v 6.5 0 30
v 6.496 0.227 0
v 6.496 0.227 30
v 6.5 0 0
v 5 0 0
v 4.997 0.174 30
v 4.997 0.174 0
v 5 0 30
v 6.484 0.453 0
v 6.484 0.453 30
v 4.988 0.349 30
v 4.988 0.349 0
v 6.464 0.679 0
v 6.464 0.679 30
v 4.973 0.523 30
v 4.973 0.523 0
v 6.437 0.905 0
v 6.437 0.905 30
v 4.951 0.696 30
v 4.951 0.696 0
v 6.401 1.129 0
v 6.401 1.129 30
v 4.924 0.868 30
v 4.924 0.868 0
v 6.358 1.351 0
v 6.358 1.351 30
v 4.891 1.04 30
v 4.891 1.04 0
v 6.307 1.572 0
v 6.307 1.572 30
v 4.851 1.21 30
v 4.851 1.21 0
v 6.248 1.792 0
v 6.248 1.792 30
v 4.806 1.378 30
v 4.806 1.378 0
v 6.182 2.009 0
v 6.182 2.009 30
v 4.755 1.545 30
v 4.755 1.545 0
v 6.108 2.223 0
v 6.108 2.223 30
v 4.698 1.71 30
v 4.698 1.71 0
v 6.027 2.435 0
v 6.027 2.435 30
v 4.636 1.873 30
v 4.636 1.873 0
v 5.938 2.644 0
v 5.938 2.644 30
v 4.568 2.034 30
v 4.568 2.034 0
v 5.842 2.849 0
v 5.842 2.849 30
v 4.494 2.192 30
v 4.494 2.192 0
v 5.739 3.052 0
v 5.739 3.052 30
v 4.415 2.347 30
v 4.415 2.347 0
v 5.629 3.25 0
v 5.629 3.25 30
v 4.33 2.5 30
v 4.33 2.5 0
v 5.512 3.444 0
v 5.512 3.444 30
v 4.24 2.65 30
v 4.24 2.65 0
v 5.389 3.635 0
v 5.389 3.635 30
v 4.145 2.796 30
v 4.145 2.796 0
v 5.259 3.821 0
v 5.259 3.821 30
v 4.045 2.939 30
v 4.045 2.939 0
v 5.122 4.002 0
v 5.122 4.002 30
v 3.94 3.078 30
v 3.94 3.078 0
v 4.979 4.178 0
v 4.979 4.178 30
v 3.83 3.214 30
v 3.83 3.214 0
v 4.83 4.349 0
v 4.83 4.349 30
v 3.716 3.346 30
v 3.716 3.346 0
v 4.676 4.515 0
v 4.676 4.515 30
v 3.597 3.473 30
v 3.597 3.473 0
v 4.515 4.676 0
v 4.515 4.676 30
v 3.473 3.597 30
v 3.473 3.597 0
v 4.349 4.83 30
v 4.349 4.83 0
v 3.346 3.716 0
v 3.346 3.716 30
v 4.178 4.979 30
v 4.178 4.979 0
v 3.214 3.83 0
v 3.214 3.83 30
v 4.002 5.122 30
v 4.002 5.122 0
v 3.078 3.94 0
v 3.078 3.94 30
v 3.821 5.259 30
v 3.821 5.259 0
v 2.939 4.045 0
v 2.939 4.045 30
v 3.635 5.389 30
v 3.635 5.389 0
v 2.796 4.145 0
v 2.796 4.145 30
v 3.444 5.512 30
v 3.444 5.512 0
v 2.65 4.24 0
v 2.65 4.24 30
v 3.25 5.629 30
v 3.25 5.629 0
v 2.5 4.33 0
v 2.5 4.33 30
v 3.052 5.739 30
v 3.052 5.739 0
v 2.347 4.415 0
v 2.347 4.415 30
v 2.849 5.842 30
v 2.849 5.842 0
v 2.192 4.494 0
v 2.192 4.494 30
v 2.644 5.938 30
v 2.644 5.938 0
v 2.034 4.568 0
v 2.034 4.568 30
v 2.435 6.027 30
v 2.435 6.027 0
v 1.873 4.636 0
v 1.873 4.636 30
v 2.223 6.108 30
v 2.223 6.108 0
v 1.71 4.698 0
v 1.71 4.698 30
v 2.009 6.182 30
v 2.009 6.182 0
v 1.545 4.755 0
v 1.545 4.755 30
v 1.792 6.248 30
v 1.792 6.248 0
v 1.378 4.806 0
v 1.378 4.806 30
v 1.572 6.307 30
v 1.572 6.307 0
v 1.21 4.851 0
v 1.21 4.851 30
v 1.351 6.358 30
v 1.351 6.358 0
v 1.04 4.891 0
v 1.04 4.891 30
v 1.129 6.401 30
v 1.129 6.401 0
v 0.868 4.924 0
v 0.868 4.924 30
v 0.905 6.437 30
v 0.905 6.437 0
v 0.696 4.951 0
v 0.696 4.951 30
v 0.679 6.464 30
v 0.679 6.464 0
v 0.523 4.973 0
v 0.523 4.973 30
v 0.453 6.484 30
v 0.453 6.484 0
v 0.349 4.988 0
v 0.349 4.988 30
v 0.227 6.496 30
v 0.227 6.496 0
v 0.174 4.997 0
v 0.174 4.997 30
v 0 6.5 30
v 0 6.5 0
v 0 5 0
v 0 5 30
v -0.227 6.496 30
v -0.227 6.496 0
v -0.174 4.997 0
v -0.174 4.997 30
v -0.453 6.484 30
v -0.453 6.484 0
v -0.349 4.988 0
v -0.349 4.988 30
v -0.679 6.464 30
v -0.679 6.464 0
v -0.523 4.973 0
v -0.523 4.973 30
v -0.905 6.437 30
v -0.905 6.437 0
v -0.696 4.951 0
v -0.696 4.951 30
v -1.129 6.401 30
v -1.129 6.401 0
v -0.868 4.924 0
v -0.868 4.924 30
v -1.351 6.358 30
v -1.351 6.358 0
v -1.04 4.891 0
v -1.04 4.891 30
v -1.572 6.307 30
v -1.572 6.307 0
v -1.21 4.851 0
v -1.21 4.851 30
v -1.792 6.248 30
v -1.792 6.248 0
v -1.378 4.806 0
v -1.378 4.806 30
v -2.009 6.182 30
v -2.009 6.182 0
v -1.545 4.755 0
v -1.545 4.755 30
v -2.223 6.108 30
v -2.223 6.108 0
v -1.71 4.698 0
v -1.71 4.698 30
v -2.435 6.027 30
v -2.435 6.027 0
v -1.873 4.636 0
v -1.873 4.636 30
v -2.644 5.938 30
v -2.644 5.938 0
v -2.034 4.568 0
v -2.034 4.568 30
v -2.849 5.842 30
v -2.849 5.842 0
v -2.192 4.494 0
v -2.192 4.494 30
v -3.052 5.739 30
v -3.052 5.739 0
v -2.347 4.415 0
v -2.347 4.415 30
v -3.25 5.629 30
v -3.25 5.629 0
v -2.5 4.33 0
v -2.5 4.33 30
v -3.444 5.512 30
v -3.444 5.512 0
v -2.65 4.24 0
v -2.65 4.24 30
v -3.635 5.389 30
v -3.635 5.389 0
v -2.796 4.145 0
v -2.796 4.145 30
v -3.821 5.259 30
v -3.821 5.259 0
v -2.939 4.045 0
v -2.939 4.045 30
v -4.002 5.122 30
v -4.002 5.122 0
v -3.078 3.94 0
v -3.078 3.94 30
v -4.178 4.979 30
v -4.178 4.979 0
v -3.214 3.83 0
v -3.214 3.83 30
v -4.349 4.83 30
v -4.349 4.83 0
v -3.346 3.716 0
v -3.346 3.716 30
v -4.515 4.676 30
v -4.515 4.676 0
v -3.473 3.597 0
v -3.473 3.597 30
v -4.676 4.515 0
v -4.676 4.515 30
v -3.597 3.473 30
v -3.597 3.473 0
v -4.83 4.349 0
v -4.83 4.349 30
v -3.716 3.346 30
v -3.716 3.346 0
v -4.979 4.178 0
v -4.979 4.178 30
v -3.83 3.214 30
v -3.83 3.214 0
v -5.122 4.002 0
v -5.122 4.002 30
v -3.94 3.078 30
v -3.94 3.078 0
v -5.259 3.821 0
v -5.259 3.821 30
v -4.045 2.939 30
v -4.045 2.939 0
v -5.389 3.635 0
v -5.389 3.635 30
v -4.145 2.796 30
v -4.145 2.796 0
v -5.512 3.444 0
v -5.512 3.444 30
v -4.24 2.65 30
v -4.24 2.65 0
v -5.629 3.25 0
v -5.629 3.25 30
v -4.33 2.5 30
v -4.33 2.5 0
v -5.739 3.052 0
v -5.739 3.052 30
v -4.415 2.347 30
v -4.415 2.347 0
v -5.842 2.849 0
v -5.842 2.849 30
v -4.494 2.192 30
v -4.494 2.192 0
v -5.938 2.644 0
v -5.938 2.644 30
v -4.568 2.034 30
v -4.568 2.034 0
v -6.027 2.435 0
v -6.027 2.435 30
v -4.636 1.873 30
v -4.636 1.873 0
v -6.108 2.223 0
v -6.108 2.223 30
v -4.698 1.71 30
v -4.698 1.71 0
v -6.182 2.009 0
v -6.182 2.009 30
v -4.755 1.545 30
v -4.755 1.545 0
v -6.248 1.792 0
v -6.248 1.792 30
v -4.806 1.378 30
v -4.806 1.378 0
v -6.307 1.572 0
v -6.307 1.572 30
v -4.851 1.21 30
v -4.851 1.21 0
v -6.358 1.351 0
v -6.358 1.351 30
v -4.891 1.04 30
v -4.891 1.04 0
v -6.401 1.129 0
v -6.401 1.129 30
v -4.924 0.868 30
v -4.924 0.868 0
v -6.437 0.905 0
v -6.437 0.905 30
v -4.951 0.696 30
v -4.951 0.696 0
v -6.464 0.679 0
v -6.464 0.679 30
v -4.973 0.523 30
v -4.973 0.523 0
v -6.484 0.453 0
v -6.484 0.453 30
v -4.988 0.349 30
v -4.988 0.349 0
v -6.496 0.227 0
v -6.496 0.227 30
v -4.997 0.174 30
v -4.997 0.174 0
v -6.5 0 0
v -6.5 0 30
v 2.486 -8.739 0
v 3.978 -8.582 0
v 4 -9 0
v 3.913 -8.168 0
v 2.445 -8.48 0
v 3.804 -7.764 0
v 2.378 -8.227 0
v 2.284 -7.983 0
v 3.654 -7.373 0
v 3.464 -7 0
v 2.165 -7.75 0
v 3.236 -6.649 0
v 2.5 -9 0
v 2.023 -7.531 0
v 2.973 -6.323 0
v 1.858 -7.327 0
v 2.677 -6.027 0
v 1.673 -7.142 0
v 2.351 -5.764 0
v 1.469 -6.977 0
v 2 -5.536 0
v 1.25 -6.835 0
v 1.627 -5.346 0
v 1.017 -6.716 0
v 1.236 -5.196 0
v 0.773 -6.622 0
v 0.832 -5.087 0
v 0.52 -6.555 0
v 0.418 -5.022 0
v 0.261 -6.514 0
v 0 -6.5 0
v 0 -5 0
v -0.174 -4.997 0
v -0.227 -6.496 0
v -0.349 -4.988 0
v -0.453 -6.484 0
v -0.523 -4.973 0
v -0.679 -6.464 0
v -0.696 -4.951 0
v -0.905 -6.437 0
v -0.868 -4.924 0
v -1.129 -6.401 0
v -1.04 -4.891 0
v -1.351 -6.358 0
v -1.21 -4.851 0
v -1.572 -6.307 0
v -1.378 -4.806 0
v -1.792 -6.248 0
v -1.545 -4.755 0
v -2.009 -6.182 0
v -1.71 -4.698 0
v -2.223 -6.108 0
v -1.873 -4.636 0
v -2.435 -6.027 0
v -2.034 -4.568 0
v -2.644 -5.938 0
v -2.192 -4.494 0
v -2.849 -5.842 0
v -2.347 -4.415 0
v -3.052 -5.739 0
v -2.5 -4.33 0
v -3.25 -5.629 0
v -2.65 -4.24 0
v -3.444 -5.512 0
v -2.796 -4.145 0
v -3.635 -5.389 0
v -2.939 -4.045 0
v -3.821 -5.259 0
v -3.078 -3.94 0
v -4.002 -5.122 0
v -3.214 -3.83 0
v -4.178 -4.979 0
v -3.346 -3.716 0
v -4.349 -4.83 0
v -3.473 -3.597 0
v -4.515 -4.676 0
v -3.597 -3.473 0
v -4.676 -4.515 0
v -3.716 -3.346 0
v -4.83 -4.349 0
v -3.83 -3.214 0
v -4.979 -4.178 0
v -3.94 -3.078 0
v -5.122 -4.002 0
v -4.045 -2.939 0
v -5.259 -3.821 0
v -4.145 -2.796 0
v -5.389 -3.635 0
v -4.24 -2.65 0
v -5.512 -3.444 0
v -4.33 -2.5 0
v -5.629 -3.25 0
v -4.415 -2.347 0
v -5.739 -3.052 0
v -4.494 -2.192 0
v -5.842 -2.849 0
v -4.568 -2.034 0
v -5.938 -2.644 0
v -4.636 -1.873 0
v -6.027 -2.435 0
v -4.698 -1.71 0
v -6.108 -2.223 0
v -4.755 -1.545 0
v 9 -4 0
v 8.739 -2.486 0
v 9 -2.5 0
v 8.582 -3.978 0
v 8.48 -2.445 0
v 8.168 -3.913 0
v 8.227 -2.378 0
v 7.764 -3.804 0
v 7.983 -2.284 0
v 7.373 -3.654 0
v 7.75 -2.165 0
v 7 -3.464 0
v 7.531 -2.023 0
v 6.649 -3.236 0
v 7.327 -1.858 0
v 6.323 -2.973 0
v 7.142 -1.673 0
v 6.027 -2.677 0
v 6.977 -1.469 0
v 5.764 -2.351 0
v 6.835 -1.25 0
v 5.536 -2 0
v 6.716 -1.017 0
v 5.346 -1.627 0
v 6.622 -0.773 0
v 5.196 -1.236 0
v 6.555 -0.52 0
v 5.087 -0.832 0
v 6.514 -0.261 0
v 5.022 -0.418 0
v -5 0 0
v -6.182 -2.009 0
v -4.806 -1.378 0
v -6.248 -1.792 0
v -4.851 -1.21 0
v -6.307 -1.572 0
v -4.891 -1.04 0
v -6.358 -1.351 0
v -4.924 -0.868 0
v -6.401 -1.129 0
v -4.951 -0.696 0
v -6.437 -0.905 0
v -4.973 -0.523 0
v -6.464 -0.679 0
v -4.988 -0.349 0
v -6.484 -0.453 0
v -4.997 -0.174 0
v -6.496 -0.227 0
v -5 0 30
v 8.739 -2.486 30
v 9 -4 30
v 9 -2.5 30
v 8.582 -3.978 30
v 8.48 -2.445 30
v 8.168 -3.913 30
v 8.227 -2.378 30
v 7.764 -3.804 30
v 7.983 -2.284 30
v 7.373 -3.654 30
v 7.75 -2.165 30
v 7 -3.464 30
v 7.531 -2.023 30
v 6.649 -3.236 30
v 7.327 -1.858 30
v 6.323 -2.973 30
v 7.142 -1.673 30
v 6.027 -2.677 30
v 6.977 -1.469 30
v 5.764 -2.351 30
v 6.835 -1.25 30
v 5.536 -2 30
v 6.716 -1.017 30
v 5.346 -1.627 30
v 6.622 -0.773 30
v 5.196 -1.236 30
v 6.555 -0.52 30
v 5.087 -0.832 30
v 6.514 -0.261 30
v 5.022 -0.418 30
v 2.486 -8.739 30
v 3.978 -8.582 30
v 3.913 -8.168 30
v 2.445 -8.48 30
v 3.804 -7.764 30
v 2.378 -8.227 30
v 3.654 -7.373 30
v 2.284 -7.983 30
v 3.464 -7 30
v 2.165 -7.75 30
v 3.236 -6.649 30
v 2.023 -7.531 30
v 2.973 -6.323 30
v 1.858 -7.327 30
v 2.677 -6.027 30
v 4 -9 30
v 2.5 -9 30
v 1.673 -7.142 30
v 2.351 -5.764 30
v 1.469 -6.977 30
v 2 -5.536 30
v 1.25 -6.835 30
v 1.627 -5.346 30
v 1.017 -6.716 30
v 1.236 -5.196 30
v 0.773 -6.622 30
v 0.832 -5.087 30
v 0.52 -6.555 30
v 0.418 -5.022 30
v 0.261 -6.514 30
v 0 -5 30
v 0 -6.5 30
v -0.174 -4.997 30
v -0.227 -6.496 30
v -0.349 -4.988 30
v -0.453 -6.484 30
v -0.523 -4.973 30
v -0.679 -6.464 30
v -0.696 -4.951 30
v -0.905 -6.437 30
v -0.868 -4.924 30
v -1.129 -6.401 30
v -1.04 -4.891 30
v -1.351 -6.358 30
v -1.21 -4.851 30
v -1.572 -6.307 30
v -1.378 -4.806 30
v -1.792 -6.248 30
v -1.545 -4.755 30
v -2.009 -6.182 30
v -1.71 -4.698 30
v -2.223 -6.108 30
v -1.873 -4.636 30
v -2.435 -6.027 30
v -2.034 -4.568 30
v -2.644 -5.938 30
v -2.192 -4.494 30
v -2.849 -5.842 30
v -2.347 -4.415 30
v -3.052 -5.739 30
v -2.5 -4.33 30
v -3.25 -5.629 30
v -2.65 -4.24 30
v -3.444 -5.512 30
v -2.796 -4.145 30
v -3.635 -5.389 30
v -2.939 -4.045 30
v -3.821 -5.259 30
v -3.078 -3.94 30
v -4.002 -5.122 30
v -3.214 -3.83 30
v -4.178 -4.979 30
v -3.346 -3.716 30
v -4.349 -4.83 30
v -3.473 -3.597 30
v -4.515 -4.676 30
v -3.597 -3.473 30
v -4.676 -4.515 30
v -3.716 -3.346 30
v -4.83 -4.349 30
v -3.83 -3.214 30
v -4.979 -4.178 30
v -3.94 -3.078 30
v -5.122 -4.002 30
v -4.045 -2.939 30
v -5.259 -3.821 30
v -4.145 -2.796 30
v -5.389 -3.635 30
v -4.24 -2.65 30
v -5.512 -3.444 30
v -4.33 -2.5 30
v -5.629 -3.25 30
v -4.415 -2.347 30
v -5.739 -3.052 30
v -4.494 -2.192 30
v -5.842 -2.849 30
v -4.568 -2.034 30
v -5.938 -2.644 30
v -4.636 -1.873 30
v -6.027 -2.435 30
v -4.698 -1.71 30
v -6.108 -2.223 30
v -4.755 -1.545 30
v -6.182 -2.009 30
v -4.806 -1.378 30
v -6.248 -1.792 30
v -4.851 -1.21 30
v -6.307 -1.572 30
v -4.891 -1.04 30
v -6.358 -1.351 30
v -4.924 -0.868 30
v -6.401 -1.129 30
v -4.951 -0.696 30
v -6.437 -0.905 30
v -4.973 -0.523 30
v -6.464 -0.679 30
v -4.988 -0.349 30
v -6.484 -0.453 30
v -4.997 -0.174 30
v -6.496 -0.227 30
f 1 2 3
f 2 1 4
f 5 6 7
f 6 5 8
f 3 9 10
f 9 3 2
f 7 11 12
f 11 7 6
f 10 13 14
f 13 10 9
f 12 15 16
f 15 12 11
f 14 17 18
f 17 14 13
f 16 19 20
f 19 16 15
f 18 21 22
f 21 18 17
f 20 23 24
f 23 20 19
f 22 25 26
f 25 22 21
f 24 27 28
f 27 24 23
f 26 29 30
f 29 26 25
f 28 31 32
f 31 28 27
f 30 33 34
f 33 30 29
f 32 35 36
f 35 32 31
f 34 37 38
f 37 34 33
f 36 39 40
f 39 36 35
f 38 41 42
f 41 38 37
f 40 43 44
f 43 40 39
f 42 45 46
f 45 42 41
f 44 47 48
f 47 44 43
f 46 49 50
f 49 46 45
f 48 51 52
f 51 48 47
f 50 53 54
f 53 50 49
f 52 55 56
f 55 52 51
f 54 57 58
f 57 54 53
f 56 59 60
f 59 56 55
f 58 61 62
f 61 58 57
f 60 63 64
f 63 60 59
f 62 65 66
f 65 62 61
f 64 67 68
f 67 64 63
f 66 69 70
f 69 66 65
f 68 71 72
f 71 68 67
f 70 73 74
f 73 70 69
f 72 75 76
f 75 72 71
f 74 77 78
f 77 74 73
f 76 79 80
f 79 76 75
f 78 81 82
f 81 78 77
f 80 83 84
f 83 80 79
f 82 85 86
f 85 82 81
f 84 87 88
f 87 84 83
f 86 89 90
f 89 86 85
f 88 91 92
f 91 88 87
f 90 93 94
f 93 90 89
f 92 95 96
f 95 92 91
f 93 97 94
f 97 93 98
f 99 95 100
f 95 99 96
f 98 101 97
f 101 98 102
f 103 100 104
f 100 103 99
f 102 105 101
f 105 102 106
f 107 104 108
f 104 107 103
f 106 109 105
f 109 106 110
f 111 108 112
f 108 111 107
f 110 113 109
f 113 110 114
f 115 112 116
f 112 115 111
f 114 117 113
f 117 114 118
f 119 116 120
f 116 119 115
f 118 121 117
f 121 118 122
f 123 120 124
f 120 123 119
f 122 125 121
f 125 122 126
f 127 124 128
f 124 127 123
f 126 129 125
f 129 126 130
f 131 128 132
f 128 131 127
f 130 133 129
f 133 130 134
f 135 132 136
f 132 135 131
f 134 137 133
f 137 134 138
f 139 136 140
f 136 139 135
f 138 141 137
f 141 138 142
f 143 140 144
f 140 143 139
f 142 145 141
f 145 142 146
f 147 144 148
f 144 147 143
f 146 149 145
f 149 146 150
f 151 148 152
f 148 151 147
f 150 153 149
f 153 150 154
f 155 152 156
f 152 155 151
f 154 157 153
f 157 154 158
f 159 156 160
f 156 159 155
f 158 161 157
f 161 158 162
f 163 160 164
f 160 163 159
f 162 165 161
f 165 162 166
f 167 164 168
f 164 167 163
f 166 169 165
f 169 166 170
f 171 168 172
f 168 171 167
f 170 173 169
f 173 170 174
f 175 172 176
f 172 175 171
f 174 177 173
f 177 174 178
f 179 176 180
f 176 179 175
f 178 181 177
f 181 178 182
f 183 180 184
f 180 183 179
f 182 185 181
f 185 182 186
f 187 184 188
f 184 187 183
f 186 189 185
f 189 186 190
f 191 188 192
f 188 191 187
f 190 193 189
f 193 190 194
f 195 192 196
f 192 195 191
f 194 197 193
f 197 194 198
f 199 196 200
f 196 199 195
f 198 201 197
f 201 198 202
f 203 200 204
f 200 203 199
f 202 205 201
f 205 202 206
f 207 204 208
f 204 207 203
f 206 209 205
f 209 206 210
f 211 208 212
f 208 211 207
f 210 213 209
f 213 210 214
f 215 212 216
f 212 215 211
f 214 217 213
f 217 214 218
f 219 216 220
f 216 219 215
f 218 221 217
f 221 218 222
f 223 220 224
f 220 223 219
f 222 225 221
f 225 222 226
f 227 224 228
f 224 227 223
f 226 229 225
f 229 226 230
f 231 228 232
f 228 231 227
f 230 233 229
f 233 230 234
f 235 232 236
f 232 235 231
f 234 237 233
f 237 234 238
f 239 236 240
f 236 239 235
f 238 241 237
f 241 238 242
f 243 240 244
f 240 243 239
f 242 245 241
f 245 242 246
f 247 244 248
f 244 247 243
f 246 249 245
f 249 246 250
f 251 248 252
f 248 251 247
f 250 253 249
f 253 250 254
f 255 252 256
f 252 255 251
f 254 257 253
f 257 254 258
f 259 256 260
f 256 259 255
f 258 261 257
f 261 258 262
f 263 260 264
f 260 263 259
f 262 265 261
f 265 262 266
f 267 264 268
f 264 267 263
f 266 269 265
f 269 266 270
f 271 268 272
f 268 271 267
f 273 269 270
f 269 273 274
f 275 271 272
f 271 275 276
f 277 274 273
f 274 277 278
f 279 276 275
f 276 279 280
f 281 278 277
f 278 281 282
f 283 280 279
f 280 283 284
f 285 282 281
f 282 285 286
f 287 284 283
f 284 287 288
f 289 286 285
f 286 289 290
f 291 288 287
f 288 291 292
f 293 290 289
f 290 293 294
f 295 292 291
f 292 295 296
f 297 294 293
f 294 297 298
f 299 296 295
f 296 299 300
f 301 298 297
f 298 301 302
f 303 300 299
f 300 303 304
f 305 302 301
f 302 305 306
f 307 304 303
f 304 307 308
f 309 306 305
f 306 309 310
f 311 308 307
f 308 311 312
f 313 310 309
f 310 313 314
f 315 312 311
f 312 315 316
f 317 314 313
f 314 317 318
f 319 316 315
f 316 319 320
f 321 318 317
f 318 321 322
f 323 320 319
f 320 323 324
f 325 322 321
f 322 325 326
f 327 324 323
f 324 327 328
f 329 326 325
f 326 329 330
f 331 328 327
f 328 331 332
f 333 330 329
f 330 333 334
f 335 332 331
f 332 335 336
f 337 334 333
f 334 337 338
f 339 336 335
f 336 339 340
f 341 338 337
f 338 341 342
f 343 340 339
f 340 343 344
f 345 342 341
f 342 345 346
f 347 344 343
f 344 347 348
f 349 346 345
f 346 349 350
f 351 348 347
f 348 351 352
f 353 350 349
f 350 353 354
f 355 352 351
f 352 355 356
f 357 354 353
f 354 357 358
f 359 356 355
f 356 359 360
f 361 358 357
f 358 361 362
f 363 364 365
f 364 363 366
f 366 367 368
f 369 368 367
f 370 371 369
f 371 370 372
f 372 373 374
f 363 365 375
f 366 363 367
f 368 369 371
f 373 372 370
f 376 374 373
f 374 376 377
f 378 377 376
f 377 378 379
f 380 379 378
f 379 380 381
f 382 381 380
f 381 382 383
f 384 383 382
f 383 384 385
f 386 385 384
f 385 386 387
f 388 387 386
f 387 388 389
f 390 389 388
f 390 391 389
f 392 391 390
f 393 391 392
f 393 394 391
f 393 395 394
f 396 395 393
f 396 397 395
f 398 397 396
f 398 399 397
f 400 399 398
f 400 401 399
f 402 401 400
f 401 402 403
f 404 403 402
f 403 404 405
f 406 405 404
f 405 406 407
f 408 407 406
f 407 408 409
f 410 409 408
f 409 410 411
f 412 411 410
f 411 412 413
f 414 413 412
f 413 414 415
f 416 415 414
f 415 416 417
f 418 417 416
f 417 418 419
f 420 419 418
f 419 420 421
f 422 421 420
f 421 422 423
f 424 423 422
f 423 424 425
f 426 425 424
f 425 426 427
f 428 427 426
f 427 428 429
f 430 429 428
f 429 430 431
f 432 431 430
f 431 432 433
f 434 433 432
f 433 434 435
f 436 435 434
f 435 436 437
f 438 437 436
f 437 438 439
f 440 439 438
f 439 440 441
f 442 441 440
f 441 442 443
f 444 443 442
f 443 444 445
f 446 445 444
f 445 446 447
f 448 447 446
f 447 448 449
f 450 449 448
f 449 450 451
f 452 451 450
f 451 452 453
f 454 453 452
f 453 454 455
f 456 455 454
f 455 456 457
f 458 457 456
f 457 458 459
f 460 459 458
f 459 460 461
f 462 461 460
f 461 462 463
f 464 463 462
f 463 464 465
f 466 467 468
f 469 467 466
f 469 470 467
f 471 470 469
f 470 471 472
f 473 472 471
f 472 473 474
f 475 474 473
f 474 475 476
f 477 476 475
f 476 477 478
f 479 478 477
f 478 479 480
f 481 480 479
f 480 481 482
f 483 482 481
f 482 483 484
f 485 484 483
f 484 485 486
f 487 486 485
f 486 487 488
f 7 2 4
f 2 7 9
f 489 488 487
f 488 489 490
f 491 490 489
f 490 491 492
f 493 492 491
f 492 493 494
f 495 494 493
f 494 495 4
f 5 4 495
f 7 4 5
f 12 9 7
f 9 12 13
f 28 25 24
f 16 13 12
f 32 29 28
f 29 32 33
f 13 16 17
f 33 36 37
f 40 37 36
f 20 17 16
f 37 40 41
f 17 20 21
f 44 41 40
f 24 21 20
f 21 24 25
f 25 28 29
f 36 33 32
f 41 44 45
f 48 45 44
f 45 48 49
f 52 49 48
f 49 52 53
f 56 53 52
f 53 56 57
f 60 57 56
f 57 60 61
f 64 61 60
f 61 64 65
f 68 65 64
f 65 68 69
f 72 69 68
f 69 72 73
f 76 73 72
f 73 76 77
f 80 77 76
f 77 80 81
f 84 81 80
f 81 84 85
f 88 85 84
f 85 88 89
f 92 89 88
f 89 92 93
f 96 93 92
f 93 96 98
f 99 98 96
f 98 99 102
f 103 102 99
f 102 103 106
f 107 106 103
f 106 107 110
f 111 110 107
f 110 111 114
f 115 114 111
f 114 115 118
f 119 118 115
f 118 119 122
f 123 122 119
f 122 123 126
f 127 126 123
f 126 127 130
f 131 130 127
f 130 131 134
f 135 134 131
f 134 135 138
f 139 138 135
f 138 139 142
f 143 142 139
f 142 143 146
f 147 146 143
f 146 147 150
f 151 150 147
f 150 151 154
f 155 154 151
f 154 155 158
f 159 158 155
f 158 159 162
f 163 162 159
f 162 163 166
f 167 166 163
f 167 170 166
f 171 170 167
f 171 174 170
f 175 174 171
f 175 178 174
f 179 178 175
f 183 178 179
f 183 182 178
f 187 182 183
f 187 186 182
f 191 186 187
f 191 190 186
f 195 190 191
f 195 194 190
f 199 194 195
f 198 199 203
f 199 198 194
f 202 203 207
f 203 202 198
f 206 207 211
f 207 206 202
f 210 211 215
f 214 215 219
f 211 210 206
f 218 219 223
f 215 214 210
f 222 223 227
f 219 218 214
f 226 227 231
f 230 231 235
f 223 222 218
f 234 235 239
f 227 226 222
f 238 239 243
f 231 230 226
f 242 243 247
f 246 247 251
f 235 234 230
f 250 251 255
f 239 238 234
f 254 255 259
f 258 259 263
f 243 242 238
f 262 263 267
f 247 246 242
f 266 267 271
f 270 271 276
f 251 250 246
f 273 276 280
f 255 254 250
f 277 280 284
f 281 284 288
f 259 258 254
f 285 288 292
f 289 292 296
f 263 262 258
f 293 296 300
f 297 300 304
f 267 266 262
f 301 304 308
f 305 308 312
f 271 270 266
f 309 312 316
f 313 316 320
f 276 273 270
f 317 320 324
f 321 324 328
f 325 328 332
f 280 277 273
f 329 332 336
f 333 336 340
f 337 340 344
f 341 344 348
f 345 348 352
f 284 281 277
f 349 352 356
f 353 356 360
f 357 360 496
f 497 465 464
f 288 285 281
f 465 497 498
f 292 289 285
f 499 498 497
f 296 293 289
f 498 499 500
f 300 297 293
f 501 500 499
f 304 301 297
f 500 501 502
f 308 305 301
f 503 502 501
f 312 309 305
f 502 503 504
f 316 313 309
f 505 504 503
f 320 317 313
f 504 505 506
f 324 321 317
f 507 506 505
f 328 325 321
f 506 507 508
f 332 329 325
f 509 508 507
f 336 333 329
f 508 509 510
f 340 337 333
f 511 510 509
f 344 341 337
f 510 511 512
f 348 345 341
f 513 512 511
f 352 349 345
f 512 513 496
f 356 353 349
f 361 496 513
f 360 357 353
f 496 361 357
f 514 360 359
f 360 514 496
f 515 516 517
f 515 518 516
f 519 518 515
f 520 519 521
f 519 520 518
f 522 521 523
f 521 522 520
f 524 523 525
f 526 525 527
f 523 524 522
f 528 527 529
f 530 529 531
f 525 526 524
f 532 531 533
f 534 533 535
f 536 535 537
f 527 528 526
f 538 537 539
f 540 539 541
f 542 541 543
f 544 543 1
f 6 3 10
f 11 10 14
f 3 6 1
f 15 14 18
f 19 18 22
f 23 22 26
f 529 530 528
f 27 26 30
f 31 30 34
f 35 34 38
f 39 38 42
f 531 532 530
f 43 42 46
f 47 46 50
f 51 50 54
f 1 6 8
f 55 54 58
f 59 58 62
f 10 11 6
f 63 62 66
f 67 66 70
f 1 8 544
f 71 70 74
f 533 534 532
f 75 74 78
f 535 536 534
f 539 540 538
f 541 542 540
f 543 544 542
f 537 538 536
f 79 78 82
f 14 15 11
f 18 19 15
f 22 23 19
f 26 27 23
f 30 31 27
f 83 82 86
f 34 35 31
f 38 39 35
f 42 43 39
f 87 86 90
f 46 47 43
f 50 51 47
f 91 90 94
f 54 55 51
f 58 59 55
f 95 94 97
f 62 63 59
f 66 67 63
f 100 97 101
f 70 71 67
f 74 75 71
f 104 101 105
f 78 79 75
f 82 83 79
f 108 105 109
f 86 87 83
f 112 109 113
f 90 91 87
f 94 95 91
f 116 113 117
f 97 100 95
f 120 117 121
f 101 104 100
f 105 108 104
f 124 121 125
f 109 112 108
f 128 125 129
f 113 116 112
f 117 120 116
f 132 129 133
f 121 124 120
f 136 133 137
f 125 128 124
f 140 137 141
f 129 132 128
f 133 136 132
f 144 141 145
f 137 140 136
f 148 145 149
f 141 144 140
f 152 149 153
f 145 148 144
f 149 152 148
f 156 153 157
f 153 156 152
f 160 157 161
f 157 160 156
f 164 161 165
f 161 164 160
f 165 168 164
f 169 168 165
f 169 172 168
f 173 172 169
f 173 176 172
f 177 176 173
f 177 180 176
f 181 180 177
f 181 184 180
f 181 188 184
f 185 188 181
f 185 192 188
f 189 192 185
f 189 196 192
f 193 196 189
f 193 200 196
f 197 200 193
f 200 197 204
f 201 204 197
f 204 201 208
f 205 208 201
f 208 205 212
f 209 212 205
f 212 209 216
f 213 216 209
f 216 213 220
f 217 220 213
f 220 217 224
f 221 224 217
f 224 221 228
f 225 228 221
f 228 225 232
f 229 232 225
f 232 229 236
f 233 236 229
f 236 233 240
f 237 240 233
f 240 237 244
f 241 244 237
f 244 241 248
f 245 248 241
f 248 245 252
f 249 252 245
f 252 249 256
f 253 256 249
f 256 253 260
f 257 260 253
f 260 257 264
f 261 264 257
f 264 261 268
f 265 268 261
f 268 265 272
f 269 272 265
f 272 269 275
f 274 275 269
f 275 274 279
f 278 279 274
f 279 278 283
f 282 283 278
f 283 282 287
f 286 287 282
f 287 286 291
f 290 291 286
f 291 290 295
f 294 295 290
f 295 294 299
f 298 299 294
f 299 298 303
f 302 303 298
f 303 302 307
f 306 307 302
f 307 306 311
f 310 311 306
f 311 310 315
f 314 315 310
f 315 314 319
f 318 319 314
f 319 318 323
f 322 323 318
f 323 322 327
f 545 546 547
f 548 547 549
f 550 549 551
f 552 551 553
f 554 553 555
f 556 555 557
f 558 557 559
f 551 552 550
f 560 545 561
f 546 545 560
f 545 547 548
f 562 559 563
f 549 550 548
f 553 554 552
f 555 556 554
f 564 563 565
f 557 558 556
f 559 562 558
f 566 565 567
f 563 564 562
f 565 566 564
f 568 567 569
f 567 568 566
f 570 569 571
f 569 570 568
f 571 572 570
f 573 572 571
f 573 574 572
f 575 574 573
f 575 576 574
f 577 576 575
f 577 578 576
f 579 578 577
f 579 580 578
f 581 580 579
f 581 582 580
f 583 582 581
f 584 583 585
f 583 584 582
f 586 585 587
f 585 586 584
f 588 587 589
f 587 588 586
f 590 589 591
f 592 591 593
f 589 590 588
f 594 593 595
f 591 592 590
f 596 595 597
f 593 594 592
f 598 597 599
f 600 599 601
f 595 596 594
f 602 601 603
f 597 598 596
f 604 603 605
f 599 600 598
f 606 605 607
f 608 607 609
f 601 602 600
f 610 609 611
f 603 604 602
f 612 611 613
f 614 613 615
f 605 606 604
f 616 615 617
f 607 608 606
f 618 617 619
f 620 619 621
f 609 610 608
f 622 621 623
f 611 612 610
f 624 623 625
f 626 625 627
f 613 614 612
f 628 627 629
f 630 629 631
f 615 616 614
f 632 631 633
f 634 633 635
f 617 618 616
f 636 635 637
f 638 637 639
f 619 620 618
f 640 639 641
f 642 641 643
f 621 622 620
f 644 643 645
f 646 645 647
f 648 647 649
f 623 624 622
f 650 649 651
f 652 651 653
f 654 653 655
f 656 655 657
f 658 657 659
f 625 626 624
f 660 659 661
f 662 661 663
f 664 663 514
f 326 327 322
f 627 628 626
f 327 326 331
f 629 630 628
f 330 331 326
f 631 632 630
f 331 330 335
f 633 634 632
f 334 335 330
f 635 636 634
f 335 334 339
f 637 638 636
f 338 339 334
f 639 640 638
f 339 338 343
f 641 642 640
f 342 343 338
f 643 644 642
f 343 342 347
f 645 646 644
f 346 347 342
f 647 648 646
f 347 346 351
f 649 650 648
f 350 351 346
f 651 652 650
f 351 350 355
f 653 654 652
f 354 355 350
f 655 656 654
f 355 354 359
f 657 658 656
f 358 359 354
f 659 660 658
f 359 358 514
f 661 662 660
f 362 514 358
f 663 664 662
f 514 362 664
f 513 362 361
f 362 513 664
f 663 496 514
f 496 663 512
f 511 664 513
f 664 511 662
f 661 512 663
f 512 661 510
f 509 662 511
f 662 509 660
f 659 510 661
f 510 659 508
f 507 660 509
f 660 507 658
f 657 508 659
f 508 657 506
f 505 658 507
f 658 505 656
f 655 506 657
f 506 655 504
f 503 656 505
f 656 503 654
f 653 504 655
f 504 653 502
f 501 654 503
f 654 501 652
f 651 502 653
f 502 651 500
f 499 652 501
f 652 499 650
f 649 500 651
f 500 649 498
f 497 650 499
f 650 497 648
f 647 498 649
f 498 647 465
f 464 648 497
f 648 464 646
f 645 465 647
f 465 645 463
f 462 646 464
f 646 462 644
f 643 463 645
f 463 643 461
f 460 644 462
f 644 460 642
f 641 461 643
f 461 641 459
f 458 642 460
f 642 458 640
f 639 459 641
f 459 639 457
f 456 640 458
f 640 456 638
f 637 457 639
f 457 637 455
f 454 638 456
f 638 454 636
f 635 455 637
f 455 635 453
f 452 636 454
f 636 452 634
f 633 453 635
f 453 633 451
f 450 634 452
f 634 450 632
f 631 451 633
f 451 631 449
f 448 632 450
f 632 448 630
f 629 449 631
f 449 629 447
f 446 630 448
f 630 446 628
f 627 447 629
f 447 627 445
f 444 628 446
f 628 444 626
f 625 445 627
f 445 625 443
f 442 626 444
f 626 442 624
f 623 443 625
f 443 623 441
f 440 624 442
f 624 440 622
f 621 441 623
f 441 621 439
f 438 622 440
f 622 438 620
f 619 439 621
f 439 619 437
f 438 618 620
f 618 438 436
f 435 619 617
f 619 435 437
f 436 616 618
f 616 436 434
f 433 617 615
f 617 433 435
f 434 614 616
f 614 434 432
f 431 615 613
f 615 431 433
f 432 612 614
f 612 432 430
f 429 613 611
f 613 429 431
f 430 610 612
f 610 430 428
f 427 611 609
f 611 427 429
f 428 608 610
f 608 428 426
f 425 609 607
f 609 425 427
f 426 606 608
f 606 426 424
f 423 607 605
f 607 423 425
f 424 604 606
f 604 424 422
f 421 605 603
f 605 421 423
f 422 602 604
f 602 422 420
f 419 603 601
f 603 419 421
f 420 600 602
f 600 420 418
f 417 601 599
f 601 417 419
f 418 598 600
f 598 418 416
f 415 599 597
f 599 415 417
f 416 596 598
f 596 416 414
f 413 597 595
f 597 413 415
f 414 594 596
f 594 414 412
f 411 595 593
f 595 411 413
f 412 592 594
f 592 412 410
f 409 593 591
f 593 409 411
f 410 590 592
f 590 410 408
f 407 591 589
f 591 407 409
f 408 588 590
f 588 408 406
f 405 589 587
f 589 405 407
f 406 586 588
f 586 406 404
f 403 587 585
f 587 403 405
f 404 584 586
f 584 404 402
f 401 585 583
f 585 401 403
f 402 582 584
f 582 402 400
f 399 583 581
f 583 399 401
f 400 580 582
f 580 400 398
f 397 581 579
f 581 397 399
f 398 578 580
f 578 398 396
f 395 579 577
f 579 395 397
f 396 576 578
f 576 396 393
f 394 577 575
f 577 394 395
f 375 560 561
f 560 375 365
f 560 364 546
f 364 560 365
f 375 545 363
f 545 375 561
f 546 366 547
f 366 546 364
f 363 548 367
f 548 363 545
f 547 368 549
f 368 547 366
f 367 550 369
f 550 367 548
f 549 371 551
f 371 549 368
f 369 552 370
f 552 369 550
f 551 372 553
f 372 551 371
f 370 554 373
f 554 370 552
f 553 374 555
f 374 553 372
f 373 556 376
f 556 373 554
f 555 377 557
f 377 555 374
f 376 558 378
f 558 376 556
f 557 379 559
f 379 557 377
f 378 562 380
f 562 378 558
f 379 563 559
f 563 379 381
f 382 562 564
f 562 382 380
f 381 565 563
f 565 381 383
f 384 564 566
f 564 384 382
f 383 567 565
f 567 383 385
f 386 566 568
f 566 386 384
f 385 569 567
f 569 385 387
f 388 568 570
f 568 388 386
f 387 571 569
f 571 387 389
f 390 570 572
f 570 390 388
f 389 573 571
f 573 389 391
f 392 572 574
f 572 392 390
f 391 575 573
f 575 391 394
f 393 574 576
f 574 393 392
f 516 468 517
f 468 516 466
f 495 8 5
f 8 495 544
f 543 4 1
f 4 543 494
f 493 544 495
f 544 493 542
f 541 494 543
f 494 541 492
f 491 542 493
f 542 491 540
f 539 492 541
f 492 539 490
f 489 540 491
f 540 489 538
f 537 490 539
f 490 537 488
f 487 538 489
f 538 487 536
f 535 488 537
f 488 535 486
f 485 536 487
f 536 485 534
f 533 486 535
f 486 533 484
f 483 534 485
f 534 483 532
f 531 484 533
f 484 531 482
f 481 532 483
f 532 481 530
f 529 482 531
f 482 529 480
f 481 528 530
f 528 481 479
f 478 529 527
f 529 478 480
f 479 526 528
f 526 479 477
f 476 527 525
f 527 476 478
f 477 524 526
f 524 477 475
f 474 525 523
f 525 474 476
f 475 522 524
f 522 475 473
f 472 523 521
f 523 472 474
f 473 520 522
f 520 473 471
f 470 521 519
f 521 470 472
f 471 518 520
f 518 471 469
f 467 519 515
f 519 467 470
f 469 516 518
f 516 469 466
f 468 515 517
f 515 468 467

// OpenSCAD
module nhf_tool_pipeclip(din=10,th=1.5,h=30) {
	module outl(r=5,h=h) {
		rotate_extrude(angle=90,$fn=60) translate([r,0]) square([th,h]);
	}
	rotate_extrude(angle=270,$fn=180) translate([din/2,0]) square([th,h]);
	translate([0,-din*3/4-th,0]) outl(r=din/4);
	translate([din*3/4+th,0,0]) rotate([0,0,180]) outl(r=din/4);
}

nhf_tool_pipeclip();
